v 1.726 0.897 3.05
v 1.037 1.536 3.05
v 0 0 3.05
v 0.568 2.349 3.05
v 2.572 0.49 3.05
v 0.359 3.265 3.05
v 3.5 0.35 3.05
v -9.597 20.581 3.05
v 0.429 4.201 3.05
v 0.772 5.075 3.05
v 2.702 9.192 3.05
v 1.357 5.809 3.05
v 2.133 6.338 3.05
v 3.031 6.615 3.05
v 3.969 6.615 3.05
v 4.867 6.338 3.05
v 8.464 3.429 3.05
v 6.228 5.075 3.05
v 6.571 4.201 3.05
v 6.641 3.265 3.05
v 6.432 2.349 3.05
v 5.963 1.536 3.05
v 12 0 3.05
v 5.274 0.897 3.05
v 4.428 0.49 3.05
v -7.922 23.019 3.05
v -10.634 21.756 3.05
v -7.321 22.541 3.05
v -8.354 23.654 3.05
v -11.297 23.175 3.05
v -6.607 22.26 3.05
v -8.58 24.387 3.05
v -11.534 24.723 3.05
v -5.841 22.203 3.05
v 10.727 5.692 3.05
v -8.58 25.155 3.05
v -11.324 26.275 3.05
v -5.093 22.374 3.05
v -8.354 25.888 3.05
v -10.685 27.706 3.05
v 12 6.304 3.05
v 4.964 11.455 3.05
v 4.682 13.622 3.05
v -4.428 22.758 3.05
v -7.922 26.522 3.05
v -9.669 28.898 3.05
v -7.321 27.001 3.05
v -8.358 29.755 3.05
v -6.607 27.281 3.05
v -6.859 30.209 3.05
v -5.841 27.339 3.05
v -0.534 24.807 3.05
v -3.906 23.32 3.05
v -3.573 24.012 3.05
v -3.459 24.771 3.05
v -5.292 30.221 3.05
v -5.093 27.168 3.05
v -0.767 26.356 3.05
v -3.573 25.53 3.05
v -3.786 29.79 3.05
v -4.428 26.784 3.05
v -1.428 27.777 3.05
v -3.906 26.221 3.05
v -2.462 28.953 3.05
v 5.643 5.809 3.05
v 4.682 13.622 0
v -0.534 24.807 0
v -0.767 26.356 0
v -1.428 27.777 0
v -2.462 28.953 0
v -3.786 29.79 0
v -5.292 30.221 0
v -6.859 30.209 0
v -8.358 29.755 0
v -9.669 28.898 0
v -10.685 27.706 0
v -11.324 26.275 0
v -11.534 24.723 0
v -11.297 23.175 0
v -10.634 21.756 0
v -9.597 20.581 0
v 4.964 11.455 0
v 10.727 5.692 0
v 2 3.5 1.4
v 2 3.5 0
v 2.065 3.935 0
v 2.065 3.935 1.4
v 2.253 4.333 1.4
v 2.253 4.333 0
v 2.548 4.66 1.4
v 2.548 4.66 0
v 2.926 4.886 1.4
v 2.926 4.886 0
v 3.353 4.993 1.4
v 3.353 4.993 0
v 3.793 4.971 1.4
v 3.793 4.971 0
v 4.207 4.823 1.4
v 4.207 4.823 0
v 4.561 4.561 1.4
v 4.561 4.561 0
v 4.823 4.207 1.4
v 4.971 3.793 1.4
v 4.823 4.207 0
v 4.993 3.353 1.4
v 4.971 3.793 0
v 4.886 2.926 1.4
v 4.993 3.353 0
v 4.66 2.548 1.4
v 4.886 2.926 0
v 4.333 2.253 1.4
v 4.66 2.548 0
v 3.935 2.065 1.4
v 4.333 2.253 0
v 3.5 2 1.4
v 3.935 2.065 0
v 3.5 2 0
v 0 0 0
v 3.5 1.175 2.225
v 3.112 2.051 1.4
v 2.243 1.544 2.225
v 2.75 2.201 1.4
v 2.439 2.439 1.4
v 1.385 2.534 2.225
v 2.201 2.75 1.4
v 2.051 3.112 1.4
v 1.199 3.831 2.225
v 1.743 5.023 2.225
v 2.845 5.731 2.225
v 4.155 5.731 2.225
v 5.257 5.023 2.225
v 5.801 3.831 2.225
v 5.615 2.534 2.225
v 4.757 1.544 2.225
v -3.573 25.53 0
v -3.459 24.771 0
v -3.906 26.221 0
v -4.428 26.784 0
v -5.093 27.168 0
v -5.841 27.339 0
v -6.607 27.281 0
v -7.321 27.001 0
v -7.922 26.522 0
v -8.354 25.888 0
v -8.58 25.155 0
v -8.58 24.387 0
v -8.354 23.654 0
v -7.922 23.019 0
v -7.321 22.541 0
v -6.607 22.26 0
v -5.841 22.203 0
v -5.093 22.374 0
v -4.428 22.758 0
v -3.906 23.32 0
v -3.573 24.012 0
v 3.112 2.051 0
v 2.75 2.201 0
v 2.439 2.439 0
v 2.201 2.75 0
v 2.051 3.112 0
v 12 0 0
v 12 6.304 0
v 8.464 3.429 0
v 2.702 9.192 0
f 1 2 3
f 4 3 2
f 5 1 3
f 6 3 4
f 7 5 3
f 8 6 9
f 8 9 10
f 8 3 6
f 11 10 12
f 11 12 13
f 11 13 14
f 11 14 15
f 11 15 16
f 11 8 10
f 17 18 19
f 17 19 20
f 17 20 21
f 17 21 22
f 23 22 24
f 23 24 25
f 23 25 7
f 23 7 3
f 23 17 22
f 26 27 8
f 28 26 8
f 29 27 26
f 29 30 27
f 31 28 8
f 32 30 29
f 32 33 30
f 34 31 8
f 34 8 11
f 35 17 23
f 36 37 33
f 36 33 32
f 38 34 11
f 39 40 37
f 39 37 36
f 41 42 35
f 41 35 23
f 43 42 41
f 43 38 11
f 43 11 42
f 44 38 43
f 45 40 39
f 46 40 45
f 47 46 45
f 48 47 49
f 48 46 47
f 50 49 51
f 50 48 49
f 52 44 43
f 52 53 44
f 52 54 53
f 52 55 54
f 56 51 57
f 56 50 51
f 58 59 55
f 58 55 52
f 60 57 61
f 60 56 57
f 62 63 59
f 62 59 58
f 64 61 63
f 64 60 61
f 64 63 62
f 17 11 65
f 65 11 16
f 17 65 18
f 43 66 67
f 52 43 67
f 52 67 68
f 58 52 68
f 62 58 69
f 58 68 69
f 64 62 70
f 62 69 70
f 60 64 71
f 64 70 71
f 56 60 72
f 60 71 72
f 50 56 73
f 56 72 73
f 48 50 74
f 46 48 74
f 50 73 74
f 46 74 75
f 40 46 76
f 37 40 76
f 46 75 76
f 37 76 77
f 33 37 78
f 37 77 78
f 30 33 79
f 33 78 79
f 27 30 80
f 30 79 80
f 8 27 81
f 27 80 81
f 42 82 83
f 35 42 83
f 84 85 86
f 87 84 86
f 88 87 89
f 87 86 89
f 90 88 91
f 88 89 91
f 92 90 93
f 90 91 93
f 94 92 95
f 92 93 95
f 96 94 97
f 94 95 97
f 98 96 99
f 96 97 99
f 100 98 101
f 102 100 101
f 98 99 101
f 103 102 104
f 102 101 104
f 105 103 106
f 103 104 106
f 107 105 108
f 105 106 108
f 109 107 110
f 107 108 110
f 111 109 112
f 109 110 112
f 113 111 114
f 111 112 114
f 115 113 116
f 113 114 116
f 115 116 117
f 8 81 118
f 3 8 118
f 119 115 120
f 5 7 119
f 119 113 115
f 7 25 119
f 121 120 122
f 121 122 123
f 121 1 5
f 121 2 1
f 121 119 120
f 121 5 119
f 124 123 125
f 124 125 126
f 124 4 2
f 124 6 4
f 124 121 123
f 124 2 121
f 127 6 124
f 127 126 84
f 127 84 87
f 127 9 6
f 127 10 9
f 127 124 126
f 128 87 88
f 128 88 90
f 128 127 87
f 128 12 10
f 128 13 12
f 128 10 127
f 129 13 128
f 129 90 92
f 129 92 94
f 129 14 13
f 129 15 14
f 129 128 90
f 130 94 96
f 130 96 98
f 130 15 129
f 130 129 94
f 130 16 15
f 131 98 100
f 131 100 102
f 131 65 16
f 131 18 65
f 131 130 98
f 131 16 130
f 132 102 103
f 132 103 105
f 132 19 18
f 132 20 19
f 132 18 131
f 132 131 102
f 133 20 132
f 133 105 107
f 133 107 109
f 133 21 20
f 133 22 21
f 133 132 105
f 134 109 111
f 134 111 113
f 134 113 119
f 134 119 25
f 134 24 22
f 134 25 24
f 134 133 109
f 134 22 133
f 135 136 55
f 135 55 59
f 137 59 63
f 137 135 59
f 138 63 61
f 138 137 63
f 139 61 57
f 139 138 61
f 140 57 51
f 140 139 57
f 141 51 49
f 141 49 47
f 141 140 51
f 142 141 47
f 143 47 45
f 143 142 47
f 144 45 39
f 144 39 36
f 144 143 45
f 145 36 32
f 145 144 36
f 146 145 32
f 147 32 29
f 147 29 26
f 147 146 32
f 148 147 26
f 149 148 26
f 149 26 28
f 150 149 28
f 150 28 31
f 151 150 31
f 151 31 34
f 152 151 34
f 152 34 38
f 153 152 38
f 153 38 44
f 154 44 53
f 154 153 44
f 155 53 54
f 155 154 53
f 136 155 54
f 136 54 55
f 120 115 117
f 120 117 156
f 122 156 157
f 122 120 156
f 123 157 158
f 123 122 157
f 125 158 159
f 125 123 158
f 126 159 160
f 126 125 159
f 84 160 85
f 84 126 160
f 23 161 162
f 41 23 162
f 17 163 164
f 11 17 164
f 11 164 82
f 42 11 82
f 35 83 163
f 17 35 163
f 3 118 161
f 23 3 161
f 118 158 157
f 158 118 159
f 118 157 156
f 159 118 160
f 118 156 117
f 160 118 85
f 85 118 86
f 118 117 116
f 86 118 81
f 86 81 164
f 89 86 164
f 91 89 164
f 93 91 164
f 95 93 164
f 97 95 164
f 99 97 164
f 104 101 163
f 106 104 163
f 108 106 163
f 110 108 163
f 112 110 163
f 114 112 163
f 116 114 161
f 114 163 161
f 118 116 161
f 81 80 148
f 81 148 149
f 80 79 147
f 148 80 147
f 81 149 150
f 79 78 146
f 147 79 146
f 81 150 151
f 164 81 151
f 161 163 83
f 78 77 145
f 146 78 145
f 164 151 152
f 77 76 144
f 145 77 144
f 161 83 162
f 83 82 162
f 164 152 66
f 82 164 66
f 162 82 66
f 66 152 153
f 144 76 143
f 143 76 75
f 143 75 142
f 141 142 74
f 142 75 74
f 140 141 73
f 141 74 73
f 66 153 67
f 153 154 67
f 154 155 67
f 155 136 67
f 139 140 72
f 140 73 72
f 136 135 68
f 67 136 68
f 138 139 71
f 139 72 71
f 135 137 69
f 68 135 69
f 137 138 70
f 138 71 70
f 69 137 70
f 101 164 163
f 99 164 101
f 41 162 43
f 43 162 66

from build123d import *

# Parameters (mm, degrees)
SKETCH1_R           = 2.575
BOSS_EXTRUDE1_DEPTH = 3.05


with BuildPart() as part:
    # Sketch1 → Boss-Extrude1 (new body)
    with BuildSketch(Plane.XY):
        with BuildLine():
            Line((0, 0), (12, 0))
            Line((12, 0), (12, 6.303908615))
            Line((12, 6.303908615), (4.681585686, 13.62232293))
            Line((4.681585686, 13.62232293), (-0.534038586, 24.807265275))
            ThreePointArc((-0.534038586, 24.807265275), (-8.358318048, 29.755478813), (-9.597116456, 20.581082657))
            Line((-9.597116456, 20.581082657), (0, 0))
        make_face()
        Polygon((10.727207794, 5.692209589), (8.464466094, 3.429467889), (2.701545827, 9.192388155), (4.964287527, 11.455129855), align=None, mode=Mode.SUBTRACT)
        with BuildLine():
            ThreePointArc((2, 3.5), (4.560660172, 4.560660172), (3.5, 2))
            Line((3.5, 2), (3.5, 3.5))
            Line((3.5, 3.5), (2, 3.5))
        make_face(mode=Mode.SUBTRACT)
        with Locations((-6.033917608, 24.770785985)):
            Circle(SKETCH1_R, mode=Mode.SUBTRACT)
    extrude(amount=BOSS_EXTRUDE1_DEPTH)

    # Sketch3 → CSK for M3 Flat Head Machine Screw1 (revolve, cut)
    with BuildSketch(Plane(origin=(3.5, 3.5, 3.05), x_dir=(0, -1, 0), z_dir=(1, 0, 0))):
        Polygon((0, 0), (0, 3.05), (1.5, 3.05), (1.5, 1.65), (3.15, 0), align=None)
    revolve(axis=Axis((3.5, 3.5, 9.4), (0, 0, -1)), mode=Mode.SUBTRACT)


solid = part.part
